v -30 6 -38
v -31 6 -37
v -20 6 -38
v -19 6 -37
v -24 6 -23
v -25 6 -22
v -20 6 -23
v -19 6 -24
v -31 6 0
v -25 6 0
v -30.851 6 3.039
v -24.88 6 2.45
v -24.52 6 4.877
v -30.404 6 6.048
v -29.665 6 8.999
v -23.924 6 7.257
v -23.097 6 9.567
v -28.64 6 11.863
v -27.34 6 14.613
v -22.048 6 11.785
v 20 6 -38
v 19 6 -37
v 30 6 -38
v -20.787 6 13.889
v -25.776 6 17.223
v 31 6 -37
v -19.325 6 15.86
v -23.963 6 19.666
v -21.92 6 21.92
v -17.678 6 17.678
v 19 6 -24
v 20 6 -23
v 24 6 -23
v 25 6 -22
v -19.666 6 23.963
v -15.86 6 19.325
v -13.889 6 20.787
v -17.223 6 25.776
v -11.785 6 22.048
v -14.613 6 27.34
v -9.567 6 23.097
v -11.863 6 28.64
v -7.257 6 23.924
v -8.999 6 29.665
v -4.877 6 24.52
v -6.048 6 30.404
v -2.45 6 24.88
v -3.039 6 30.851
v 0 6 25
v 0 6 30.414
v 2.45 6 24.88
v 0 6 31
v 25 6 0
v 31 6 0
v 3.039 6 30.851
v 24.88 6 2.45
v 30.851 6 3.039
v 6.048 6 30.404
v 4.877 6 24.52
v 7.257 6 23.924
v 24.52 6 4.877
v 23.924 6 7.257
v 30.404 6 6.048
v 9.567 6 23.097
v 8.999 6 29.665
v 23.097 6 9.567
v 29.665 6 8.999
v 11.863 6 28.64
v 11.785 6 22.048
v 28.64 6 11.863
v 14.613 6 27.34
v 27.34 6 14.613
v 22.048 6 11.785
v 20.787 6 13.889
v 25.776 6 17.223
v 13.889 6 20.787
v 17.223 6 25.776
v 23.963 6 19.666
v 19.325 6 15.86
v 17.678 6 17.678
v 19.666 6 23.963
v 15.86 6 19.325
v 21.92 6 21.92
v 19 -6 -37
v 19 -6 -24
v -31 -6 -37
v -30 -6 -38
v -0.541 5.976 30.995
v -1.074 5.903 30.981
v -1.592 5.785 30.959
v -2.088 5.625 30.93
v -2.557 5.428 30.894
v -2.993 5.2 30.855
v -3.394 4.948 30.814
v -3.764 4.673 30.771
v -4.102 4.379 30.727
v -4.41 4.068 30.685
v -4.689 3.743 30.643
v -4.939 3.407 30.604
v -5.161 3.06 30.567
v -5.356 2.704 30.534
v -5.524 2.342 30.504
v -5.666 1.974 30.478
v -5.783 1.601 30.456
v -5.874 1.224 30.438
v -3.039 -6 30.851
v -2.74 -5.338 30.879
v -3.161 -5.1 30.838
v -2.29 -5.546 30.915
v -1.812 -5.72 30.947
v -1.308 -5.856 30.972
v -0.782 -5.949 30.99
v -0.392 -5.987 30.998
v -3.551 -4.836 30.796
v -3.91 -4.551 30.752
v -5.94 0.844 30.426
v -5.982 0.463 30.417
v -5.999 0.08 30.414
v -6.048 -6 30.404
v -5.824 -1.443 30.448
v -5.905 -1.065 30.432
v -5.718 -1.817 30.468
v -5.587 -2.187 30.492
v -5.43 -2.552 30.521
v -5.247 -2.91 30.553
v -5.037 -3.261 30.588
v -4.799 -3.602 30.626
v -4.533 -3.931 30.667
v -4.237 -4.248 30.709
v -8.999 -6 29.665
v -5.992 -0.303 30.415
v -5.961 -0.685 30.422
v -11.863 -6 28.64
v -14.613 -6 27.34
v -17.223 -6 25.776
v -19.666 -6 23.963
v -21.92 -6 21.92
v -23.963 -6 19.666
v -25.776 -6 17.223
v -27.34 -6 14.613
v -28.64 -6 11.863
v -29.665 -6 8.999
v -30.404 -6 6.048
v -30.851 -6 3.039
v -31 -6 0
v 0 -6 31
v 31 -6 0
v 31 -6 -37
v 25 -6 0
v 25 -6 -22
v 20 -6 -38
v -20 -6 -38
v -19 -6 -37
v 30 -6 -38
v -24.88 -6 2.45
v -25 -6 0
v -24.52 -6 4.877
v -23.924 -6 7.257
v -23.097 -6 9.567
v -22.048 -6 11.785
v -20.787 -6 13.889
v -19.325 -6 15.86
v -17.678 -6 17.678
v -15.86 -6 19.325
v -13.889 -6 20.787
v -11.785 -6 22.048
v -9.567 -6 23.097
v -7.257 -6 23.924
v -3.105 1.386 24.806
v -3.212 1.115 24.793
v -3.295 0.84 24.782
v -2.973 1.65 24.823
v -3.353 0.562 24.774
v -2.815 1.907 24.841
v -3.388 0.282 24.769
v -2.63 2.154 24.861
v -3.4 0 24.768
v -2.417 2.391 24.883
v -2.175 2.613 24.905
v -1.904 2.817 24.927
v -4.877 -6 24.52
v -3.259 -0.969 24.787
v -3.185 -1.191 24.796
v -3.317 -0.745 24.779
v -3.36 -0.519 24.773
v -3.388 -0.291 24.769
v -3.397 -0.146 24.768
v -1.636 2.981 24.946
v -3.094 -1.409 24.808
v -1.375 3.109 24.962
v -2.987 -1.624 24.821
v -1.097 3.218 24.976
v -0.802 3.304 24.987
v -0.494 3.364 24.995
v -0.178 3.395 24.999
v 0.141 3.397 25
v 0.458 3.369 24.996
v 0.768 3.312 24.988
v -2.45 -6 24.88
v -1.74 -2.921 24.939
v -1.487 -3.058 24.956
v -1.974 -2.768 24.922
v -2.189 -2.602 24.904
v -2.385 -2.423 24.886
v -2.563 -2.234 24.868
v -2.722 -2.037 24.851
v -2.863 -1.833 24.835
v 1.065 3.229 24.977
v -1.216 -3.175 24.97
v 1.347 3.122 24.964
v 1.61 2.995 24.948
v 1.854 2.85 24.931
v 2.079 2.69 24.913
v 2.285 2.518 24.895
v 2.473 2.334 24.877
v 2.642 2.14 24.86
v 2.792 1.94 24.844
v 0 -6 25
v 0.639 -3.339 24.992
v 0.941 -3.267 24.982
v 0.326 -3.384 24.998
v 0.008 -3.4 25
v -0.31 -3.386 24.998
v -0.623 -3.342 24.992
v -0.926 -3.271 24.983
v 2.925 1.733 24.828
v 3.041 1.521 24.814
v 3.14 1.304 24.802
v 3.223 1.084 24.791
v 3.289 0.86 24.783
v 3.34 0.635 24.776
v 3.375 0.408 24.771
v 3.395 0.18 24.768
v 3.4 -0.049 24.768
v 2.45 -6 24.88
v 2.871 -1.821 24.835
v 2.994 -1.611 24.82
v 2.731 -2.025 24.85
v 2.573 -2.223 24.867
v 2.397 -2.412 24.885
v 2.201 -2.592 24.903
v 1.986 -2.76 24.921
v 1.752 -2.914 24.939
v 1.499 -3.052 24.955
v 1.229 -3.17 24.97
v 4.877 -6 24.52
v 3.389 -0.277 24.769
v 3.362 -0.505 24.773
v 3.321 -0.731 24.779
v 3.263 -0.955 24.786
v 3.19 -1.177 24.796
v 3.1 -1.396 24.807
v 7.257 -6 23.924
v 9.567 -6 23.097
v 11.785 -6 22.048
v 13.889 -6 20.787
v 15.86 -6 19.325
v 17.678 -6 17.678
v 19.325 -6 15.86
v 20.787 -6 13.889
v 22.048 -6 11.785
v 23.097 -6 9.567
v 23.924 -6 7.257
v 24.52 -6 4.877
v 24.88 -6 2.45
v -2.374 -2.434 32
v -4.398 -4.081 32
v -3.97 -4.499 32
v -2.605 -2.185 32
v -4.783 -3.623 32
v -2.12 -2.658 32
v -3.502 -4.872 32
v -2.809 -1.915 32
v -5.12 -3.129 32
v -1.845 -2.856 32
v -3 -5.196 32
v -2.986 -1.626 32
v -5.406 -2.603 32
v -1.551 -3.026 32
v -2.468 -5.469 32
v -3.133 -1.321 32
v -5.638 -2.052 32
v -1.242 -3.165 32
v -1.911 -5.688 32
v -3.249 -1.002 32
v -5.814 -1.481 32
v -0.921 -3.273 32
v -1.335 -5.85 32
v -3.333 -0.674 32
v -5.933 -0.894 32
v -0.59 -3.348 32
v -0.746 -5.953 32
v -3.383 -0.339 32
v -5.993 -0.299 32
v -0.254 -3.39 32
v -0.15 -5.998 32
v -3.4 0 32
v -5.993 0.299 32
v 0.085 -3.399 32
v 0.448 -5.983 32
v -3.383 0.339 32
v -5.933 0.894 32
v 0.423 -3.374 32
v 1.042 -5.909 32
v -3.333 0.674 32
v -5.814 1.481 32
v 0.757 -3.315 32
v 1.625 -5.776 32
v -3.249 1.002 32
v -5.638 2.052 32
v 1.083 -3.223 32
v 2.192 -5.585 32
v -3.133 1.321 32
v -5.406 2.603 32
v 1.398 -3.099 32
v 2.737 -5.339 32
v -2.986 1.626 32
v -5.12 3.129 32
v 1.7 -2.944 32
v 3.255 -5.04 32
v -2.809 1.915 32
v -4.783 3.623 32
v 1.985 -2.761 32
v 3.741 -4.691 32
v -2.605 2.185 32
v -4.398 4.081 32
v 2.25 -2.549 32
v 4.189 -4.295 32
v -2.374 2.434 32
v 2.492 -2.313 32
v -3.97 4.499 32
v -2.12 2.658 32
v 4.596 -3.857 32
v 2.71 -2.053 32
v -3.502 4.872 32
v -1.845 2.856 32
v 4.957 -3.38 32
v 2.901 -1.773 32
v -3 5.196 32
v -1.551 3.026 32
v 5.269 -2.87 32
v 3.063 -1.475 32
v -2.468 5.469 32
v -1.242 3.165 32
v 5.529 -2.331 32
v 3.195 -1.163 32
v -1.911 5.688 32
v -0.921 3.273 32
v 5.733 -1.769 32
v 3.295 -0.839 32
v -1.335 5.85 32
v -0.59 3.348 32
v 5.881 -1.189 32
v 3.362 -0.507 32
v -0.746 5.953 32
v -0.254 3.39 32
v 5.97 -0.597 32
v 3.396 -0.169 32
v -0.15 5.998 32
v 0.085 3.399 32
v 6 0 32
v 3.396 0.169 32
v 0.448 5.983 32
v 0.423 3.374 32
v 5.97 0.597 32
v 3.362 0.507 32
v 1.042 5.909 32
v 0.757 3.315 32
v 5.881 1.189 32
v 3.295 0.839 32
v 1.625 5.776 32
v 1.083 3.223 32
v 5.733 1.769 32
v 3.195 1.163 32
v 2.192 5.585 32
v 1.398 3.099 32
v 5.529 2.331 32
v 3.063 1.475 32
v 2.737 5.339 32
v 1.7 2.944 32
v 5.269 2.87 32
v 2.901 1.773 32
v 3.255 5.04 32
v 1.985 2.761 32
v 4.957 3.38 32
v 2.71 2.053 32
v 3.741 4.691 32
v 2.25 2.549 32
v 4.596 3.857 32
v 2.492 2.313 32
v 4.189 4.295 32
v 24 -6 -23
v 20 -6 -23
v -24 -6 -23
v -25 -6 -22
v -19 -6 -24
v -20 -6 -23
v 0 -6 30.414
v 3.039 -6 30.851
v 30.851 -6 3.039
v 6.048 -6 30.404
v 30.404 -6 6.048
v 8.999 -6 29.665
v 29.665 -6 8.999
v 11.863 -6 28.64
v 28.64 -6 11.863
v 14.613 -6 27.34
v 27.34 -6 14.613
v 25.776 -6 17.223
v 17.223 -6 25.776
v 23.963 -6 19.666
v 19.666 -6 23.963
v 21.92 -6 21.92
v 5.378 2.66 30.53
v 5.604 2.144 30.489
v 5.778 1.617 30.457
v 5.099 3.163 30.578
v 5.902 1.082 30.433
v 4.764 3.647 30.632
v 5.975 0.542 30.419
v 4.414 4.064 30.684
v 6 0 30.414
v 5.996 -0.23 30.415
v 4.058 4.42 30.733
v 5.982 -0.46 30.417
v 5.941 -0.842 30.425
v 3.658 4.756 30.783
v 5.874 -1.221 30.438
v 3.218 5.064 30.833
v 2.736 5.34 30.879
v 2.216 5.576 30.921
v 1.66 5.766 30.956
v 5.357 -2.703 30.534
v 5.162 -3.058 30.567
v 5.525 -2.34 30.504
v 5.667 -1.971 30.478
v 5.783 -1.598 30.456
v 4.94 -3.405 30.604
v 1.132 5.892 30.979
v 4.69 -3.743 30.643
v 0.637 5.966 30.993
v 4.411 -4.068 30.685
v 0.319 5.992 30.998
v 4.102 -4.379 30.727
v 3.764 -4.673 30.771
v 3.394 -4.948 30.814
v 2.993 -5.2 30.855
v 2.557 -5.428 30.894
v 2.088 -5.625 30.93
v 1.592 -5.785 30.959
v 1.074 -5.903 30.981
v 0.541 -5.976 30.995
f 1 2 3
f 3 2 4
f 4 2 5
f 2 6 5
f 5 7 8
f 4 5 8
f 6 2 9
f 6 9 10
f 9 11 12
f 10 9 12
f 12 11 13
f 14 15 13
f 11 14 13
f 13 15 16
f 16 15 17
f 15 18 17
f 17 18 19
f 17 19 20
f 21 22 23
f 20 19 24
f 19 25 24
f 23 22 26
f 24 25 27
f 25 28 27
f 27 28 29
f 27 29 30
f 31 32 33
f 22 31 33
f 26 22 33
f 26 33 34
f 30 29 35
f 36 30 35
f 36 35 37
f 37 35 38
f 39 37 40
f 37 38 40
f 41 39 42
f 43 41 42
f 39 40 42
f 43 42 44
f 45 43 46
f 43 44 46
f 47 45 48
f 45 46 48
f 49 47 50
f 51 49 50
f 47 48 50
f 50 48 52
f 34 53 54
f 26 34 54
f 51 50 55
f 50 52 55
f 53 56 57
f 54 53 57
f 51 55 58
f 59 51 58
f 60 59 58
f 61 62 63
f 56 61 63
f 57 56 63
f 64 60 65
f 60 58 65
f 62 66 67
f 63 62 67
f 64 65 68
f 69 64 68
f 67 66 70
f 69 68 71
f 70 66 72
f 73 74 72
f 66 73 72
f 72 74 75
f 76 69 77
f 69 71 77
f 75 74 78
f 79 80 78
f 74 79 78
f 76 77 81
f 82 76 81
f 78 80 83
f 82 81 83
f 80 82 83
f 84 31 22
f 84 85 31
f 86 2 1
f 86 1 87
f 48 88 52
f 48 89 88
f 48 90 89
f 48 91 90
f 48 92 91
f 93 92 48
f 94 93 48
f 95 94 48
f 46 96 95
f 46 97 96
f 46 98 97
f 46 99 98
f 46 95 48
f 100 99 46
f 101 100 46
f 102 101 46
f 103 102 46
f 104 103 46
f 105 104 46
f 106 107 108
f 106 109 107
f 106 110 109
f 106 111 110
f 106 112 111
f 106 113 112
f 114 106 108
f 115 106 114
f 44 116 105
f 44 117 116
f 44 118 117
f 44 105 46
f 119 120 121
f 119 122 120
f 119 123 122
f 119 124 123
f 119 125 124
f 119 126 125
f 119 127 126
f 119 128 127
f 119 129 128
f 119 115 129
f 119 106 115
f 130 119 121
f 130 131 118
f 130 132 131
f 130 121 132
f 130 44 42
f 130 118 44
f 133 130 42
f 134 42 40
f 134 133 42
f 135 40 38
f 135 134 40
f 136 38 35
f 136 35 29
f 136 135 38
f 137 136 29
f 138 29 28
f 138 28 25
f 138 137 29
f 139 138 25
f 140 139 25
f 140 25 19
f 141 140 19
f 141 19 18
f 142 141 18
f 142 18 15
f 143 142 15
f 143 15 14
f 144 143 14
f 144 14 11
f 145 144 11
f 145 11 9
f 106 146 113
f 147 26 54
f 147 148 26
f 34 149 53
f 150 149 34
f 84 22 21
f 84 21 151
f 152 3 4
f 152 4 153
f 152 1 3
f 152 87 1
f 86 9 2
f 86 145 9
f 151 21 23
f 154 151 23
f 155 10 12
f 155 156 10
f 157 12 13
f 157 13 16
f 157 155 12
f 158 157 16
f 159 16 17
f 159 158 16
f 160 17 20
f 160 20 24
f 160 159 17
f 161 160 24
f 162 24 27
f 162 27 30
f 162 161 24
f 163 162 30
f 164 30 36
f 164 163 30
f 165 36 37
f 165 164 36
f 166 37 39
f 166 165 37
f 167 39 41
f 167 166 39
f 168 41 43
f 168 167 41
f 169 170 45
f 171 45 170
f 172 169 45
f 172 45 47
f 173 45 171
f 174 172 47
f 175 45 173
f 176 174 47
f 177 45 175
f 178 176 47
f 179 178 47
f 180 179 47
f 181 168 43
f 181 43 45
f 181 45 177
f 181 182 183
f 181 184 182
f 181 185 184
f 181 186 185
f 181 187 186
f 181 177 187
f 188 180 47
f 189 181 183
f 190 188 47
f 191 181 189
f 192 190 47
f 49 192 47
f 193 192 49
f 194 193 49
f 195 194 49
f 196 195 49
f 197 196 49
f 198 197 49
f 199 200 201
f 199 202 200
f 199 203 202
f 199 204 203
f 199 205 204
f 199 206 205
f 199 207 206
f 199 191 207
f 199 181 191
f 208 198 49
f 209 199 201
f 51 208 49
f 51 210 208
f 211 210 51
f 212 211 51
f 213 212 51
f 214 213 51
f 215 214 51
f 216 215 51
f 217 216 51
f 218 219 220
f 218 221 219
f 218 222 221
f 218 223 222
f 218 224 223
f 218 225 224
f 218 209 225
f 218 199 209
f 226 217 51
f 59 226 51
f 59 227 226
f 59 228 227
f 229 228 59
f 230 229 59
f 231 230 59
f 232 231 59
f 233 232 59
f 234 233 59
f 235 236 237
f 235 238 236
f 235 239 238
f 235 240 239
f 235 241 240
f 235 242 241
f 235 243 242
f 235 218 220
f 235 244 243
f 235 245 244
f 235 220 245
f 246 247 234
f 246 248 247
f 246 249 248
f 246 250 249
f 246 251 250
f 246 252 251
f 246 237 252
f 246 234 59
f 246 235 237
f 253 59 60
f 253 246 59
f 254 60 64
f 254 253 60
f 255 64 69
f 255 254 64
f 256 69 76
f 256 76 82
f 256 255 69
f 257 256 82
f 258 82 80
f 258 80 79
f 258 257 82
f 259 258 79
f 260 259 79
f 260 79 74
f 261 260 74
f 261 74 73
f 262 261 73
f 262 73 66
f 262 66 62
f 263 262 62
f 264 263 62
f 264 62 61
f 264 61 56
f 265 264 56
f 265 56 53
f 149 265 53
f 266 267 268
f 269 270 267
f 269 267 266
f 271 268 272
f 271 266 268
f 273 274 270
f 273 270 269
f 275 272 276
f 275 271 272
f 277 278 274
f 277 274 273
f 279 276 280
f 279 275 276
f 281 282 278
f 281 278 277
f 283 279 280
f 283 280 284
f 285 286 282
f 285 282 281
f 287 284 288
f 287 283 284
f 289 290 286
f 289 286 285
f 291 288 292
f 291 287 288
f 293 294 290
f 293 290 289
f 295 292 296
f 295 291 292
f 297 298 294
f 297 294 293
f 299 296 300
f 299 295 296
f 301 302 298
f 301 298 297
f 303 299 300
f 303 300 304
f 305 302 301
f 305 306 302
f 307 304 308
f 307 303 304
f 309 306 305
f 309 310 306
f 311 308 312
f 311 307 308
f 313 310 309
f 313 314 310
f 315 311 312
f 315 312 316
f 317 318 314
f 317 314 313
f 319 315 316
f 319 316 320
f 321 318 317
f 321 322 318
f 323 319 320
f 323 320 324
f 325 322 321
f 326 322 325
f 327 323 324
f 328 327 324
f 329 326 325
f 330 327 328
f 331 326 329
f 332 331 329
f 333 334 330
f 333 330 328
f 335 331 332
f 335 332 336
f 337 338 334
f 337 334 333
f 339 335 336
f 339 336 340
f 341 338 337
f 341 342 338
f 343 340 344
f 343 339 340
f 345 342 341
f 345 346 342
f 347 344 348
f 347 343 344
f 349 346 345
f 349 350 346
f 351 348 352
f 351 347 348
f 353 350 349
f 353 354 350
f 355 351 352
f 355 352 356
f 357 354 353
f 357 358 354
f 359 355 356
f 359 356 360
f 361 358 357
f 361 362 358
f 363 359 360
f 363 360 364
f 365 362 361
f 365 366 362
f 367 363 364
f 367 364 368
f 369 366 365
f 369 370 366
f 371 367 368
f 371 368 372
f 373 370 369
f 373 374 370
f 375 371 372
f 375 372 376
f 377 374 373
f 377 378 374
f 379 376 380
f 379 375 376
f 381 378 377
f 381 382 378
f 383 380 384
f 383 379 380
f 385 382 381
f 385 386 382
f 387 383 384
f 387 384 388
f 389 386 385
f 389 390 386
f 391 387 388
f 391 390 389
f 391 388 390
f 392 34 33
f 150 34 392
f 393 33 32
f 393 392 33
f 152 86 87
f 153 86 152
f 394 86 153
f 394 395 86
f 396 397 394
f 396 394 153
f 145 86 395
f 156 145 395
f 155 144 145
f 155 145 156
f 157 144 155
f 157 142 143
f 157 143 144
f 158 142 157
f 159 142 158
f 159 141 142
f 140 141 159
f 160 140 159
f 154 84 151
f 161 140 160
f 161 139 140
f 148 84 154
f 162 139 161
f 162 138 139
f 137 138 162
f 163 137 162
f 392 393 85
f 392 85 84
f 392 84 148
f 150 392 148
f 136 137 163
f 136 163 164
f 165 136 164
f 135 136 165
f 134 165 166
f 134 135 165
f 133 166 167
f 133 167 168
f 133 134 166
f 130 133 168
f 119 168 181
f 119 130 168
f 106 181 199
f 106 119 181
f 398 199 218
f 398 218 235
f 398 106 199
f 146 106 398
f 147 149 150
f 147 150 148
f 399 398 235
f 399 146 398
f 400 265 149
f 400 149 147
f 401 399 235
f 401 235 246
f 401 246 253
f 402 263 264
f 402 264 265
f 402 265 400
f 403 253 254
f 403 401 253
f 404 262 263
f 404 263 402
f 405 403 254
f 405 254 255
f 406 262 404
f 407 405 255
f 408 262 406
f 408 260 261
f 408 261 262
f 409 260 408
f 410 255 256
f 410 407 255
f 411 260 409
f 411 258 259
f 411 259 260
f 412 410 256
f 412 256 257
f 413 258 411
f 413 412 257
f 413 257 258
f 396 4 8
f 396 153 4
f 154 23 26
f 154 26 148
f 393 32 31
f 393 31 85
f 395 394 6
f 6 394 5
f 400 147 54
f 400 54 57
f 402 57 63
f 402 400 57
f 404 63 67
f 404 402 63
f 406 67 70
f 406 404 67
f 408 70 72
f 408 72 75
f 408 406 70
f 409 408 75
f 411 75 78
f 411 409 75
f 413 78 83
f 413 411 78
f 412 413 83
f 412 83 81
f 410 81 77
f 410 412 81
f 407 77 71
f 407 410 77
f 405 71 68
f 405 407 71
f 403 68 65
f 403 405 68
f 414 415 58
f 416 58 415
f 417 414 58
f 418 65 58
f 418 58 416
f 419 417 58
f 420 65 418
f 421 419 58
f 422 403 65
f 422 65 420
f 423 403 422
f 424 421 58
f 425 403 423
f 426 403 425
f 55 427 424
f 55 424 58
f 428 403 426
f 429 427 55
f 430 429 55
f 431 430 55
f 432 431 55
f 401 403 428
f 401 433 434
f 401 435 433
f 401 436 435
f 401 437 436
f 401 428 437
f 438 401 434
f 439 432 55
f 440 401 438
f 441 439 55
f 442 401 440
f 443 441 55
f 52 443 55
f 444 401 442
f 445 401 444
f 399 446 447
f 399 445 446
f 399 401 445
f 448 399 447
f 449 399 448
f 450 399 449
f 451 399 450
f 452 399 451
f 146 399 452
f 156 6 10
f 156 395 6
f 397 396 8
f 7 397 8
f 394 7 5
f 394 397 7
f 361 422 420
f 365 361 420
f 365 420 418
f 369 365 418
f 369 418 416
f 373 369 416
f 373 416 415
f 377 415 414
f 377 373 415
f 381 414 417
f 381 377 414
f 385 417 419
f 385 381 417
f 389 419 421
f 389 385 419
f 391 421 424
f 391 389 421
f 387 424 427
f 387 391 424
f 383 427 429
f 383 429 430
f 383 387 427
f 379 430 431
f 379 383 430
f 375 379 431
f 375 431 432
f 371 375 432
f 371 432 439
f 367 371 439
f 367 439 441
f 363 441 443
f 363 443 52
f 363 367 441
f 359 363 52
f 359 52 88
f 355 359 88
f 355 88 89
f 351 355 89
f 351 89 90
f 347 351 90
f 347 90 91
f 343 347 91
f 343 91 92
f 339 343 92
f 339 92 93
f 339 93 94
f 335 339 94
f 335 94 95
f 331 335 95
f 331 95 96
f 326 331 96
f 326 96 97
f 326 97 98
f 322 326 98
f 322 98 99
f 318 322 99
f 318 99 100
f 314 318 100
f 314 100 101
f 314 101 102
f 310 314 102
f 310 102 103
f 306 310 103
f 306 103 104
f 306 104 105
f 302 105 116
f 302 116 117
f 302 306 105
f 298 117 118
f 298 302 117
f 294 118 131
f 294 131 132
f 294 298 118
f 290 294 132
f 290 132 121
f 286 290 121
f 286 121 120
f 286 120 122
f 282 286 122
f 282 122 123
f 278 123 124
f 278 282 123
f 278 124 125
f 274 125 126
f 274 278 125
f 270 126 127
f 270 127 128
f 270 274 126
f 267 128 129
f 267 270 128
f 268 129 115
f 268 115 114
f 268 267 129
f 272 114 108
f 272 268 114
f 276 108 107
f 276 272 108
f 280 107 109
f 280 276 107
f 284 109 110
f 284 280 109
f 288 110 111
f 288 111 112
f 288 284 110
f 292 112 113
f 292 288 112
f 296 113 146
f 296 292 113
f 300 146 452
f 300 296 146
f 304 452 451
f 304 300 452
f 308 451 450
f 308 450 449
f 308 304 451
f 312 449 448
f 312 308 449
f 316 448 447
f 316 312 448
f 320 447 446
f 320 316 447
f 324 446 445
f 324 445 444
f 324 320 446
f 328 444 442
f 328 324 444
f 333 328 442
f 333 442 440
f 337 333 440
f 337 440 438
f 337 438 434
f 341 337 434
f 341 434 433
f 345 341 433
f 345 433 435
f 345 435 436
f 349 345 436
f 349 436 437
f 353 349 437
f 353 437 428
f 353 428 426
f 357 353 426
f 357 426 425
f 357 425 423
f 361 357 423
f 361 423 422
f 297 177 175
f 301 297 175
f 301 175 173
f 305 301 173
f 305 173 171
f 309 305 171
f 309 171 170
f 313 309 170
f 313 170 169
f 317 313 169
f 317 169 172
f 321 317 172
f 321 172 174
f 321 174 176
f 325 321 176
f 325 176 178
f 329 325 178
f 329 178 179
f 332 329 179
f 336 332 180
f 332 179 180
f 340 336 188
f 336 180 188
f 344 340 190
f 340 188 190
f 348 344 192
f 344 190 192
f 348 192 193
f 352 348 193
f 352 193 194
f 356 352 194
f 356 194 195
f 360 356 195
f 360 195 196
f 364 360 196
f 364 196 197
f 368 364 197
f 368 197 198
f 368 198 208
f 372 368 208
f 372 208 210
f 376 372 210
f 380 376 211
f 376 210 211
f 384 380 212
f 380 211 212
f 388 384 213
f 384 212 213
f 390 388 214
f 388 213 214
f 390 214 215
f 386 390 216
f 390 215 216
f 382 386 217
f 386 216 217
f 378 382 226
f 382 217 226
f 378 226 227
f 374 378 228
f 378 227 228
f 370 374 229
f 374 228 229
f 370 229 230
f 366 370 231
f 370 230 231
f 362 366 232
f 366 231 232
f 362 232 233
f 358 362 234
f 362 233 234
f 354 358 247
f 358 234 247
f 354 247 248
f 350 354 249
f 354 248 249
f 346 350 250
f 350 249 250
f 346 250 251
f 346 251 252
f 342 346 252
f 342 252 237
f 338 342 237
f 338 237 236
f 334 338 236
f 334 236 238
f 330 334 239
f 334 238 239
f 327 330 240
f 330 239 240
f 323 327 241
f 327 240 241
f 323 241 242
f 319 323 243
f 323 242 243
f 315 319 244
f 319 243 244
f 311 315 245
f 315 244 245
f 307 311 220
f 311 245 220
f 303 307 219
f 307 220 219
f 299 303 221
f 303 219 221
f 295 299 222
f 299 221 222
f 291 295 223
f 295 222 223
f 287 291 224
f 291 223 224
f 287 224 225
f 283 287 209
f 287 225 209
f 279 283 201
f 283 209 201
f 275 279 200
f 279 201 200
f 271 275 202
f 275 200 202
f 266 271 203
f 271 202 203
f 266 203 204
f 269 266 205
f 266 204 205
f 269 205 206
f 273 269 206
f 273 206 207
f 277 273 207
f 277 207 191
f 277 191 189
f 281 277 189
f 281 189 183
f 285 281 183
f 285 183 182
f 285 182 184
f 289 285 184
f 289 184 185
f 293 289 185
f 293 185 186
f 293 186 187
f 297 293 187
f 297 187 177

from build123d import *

# Parameters (mm, degrees)
F1_DEPTH = 6
F2_SIZE2 = 1
F2_SIZE  = 1
F4_R     = 6
F5_DEPTH = 1.5861874485
F6_D     = 6.8


with BuildPart() as f1:
    # F0 (on Front) → F1 (new body, symmetric)
    with BuildSketch(Plane.XZ):
        with BuildLine():
            ThreePointArc((-25, 0), (0, 25), (25, 0))
            Line((25, 0), (25, -23))
            Line((25, -23), (19, -23))
            Line((19, -23), (19, -38))
            Line((19, -38), (31, -38))
            Line((31, -38), (31, 0))
            ThreePointArc((31, 0), (0, 31), (-31, 0))
            Line((-31, 0), (-31, -38))
            Line((-31, -38), (-19, -38))
            Line((-19, -38), (-19, -23))
            Line((-19, -23), (-25, -23))
            Line((-25, -23), (-25, 0))
        make_face()
    extrude(amount=F1_DEPTH, both=True)

    # F2
    f2_edges = [f1.edges().sort_by_distance(p)[0] for p in [
        (-25, 0, -23),
        (-19, 0, -23),
        (-19, 0, -38),
        (-31, 0, -38),
        (19, 0, -38),
        (31, 0, -38),
        (25, 0, -23),
        (19, 0, -23),
    ]]
    chamfer(f2_edges, length=F2_SIZE, length2=F2_SIZE2)

    # F4 (on offset) → F5 (join, through all)
    with BuildSketch(Plane.XY.offset(32)):
        Circle(F4_R)
    extrude(amount=-F5_DEPTH)

    # F6 (through all)
    with Locations(Plane.XY.offset(32)):
        with Locations((0, 0)):
            Hole(F6_D / 2)


solid = f1.part
